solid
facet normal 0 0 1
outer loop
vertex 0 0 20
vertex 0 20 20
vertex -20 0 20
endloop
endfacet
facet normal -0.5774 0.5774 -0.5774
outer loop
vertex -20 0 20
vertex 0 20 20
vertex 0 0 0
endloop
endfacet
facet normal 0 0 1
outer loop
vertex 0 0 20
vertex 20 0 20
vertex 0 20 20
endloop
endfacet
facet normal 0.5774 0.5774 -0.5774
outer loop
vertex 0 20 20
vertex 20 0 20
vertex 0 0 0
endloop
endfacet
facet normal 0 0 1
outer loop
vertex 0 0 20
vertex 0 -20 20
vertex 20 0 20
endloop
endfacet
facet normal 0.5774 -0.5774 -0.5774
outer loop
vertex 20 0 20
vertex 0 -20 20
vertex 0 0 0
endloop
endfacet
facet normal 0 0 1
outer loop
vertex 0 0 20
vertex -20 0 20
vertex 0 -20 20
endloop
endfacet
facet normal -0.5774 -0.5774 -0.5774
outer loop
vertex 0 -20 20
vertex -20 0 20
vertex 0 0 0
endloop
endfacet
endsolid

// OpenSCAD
// A polygon with an edge on the axis: rotate_extrude() collapses those points to one vertex
// each, which gives triangles that use a vertex twice. Exporting without rendering must
// still work (lib3mf v1 rejected such triangles, #6716).
rotate_extrude($fn=4) polygon([[0, 0], [20, 20], [0, 20]]);
